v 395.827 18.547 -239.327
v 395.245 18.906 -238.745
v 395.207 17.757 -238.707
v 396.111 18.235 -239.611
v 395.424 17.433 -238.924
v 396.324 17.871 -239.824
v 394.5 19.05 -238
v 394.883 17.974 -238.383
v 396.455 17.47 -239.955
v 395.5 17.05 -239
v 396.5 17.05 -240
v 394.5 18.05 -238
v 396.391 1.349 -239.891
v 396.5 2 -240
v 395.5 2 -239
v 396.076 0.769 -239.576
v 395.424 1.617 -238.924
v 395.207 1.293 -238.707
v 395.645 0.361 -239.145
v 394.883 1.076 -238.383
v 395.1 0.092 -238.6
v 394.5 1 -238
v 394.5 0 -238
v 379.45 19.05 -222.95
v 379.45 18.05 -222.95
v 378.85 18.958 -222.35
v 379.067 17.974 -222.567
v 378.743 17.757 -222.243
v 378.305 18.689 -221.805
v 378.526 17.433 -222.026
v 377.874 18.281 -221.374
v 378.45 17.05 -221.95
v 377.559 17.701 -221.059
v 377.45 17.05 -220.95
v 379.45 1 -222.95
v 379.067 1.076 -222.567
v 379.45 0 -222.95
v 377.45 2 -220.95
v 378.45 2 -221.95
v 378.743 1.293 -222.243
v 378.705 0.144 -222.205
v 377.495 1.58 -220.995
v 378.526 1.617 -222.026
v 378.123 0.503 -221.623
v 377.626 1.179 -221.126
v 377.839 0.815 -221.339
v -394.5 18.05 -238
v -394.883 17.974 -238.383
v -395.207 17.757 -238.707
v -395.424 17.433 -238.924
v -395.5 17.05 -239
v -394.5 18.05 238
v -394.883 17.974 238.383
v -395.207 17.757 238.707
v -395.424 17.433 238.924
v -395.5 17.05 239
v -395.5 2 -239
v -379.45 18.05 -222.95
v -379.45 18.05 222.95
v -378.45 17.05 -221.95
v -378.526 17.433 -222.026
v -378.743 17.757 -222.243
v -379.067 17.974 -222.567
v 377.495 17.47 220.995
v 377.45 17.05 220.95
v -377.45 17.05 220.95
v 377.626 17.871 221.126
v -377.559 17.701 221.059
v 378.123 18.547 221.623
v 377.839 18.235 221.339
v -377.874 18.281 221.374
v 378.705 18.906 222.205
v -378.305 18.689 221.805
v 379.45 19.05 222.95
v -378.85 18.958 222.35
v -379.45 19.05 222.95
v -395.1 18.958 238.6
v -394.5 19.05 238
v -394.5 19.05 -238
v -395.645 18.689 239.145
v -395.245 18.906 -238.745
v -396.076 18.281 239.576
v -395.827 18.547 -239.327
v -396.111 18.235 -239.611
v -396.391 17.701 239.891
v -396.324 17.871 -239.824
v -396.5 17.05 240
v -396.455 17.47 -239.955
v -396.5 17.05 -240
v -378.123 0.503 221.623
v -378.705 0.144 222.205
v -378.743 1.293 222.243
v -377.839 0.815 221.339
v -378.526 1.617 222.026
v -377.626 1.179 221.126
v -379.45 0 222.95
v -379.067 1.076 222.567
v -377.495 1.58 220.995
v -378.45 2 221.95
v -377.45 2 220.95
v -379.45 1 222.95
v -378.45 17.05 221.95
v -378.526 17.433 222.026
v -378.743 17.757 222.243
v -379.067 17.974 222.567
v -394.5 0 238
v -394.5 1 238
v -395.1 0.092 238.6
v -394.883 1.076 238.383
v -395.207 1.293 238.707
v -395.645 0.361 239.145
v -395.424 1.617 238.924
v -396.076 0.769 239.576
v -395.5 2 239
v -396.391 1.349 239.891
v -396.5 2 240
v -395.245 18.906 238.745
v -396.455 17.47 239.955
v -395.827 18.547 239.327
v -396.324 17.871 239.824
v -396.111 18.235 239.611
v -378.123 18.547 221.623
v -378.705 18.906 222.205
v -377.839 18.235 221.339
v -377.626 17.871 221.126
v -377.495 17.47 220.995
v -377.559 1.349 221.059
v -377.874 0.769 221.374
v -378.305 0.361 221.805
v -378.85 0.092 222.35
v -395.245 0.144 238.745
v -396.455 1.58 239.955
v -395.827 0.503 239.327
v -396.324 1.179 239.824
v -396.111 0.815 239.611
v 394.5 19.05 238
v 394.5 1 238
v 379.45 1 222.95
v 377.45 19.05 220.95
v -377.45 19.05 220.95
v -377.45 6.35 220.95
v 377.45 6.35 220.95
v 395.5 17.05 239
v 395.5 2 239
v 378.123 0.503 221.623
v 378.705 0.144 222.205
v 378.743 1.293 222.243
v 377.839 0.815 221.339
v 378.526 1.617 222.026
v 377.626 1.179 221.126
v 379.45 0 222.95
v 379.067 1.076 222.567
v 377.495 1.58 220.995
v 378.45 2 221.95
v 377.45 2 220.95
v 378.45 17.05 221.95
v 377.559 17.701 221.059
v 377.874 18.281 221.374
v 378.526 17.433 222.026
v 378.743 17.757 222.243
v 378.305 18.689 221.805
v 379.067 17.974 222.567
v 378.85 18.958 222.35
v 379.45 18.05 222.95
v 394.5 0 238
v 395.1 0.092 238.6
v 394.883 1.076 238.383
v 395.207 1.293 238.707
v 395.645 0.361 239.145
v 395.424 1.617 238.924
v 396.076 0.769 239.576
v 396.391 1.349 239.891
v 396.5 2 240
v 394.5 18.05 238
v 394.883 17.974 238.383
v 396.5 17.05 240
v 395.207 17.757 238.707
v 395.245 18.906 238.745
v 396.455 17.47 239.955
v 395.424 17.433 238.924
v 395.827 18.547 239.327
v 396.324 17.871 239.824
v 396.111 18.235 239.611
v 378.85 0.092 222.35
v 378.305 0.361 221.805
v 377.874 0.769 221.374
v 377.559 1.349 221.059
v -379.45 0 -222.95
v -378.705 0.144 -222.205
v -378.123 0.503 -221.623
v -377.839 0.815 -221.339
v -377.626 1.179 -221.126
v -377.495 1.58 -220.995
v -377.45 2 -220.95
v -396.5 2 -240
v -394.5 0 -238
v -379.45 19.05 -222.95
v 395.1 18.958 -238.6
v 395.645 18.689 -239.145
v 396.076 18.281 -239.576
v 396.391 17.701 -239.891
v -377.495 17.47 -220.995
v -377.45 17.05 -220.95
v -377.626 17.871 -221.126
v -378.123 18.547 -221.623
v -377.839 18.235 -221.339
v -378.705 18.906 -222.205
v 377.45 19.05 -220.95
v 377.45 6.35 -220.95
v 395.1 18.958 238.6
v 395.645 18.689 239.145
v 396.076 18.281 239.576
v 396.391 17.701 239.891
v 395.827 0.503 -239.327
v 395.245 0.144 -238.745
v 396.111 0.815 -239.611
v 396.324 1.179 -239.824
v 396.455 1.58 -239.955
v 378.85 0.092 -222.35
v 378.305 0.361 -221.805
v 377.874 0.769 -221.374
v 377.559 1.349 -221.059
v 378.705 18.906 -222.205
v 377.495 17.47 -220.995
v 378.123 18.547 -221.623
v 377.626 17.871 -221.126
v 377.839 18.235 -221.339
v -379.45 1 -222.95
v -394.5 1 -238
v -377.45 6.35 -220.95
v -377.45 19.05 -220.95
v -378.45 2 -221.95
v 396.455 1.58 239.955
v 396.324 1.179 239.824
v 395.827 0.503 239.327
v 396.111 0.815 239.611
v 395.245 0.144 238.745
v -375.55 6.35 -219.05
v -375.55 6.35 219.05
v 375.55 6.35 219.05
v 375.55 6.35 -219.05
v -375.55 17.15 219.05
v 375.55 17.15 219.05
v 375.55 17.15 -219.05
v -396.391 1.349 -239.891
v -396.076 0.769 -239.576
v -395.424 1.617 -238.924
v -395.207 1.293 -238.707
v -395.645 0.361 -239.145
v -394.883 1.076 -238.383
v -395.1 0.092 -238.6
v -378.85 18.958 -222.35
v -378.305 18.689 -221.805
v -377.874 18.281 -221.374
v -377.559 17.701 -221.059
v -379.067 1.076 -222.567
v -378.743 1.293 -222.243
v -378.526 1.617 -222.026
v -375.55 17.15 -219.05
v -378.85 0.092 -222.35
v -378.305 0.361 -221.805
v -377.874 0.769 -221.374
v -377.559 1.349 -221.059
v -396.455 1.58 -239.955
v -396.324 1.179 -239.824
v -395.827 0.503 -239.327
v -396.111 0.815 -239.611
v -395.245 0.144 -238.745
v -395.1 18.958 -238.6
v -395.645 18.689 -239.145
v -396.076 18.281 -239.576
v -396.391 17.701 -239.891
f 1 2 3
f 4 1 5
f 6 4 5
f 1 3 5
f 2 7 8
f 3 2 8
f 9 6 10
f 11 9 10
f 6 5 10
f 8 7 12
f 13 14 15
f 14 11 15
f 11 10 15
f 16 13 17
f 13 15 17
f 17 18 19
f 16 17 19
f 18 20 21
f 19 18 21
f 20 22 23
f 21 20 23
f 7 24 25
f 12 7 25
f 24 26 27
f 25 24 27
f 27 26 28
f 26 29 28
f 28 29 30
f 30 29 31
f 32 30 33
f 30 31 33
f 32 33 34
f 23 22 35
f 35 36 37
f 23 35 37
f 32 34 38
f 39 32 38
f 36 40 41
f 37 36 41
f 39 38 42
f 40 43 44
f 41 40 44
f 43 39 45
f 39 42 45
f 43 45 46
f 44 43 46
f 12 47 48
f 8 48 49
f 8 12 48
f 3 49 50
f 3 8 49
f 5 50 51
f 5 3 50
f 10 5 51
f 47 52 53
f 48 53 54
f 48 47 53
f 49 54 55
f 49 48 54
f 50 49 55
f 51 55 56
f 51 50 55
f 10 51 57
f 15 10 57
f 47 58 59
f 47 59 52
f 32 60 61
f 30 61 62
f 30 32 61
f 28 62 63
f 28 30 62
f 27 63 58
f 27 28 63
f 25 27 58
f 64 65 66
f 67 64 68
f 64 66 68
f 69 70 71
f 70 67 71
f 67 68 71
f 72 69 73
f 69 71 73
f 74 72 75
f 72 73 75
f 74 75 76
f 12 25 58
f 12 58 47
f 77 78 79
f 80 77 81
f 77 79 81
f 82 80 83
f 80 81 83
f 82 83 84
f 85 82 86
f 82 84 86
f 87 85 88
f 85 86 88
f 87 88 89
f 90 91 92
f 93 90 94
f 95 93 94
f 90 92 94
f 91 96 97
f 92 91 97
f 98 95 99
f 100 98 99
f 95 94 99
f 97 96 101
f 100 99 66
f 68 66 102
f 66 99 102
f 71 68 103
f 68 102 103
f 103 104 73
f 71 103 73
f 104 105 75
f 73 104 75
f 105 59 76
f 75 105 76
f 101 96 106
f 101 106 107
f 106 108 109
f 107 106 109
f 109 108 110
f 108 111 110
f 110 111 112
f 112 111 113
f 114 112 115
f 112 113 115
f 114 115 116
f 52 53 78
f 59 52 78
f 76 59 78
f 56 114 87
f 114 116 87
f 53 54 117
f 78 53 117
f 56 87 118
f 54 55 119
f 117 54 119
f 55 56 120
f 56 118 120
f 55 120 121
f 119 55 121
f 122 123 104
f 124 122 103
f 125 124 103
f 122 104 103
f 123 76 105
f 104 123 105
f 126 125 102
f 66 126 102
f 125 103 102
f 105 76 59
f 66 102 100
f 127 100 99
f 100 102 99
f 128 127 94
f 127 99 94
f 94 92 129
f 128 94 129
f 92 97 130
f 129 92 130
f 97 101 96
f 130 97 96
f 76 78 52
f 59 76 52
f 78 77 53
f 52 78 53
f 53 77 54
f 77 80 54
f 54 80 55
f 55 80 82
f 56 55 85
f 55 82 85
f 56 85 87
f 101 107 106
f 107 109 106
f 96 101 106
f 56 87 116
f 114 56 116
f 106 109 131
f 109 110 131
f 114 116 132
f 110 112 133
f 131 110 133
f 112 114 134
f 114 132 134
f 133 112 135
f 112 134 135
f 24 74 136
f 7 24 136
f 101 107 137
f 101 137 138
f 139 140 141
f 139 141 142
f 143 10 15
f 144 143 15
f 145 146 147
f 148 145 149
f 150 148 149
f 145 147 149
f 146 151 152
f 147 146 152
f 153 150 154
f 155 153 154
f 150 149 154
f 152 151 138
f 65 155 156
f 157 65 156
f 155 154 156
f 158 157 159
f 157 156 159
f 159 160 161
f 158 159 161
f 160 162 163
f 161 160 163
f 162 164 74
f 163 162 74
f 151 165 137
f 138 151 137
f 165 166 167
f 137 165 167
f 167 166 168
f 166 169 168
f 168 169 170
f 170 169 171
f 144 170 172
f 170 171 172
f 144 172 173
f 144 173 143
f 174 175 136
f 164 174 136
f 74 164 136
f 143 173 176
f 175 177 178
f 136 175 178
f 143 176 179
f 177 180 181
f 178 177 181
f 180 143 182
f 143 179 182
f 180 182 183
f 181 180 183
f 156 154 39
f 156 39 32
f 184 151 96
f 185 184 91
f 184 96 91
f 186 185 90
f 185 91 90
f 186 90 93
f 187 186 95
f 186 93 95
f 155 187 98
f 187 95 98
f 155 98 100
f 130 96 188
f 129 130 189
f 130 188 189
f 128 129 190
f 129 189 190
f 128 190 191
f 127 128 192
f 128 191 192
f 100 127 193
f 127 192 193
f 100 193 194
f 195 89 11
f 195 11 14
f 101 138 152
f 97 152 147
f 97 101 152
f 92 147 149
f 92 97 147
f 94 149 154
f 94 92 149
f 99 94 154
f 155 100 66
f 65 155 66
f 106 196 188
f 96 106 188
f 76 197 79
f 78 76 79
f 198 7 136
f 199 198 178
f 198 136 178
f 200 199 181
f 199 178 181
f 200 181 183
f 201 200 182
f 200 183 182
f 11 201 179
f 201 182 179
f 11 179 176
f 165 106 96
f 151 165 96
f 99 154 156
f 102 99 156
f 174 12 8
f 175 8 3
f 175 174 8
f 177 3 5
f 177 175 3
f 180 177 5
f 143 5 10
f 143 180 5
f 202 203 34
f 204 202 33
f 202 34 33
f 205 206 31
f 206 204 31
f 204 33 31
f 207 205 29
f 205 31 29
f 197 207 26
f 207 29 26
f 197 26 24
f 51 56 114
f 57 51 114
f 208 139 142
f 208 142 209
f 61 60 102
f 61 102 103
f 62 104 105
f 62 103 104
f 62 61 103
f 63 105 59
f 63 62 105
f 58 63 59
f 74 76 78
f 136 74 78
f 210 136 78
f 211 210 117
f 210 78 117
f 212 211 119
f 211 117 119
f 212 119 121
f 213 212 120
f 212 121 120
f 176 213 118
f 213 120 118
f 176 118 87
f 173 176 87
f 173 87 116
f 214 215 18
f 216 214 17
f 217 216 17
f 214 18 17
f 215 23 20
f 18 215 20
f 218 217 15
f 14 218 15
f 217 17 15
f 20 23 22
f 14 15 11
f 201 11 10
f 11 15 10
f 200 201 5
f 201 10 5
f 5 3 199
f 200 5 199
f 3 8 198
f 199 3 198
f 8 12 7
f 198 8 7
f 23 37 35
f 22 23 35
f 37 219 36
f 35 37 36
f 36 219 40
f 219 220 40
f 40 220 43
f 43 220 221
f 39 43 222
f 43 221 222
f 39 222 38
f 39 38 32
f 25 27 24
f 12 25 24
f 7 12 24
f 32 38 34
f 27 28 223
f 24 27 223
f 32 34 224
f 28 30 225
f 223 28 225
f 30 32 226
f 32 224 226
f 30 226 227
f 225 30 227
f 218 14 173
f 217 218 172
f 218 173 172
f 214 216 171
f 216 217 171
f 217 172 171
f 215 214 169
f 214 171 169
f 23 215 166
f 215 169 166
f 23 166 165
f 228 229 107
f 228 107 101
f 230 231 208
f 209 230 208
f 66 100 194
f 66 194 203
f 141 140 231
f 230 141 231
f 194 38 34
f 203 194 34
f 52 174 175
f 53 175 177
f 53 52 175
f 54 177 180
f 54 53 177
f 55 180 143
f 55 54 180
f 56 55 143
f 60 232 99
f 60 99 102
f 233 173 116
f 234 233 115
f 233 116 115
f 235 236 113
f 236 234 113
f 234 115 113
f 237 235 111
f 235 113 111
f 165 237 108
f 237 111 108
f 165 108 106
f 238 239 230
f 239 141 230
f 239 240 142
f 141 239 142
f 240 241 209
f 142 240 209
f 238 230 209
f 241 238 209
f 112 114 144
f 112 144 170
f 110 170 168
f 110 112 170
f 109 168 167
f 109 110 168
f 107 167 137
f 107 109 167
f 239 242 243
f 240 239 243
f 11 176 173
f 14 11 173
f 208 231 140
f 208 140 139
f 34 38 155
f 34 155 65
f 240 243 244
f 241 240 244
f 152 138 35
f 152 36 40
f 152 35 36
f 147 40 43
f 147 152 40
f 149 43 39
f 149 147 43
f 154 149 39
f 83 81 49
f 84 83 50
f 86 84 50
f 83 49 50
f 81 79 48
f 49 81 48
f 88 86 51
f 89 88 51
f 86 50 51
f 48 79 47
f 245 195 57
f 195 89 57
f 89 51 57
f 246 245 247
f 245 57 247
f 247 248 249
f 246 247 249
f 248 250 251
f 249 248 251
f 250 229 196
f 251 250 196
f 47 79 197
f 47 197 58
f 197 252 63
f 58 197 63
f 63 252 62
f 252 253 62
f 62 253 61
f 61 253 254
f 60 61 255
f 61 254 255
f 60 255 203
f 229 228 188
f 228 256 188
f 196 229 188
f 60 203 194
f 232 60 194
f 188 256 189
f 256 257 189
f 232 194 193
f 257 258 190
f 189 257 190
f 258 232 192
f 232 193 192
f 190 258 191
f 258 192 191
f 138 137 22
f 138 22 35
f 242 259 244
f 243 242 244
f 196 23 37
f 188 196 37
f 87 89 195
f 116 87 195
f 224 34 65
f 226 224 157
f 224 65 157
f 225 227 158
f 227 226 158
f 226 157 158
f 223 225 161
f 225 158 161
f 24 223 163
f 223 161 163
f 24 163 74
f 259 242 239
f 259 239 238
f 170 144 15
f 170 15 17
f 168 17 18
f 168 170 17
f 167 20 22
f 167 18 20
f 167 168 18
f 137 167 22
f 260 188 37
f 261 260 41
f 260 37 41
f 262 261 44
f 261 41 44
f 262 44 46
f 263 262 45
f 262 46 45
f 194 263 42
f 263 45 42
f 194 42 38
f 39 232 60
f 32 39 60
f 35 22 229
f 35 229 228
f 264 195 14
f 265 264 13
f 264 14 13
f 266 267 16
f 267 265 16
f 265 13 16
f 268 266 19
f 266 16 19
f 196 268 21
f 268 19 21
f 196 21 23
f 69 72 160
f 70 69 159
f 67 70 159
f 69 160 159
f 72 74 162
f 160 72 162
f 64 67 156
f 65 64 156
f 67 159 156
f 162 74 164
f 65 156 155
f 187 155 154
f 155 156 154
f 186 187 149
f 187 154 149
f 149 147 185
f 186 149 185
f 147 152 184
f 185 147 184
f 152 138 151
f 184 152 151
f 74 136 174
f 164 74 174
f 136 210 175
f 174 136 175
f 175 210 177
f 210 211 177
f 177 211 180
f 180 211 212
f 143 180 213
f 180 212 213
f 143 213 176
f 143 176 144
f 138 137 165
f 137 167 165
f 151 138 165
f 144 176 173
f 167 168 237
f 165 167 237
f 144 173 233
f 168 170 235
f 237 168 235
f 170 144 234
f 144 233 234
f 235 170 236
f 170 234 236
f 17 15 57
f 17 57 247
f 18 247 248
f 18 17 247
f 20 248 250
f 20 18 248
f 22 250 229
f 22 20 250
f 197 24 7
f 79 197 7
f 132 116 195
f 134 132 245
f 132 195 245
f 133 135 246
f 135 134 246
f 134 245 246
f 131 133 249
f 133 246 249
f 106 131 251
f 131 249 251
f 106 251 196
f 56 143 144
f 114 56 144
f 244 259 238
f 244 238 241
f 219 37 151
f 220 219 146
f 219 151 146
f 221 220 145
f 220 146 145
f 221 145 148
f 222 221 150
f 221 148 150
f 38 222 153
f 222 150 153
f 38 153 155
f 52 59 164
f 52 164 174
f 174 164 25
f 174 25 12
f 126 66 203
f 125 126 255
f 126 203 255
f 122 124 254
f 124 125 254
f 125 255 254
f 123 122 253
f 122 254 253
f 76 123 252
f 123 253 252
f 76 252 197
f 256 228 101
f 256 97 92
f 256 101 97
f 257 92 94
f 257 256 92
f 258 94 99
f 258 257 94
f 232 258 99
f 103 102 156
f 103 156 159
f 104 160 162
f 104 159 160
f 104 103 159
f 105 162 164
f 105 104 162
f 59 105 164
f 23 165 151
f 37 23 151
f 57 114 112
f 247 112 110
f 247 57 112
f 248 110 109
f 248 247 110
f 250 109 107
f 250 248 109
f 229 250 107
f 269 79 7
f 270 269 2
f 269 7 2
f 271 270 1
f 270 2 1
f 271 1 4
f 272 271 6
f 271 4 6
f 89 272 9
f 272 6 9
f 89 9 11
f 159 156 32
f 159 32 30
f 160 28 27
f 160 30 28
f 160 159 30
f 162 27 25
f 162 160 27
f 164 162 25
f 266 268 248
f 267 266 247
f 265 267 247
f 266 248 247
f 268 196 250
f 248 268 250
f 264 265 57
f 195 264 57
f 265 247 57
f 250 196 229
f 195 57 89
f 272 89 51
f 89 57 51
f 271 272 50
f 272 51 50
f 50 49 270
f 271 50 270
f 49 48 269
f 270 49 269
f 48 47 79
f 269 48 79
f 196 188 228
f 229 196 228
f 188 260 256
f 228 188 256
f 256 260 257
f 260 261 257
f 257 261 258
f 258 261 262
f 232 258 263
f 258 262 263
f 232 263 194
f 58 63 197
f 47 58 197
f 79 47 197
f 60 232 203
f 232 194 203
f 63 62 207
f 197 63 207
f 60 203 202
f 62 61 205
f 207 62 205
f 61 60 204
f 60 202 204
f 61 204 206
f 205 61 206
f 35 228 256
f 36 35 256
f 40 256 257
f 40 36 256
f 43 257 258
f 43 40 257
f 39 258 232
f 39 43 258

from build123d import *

# Parameters (mm, degrees)
TUBO_CUADRADO_2_X_2_X_0_25_1_DEPTH      = 507.940768363
TUBO_CUADRADO_2_X_2_X_0_25_1_DEPTH_BACK = 27.940768363
TUBO_CUADRADO_2_X_2_X_0_25_1_2_DEPTH    = 848.881536726
TUBO_CUADRADO_2_X_2_X_0_25_1_3_DEPTH    = 535.881536726
TUBO_CUADRADO_2_X_2_X_0_25_1_4_DEPTH    = 848.881536726
CROQUIS2_W                              = 754.9
CROQUIS2_H                              = 441.9
SALIENTE_EXTRUIR1_DEPTH                 = 12.7
VACIADO1_T                              = -1.9


with BuildPart() as part:
    # Sketch1 → Tubo cuadrado 2 X 2 X 0.25(1) (new, two sides: drawn at the far end of the back side and taken through both)
    with BuildSketch(Plane(origin=(-386.975, 9.525, -240), x_dir=(1, 0, 0), z_dir=(0, 0, 1)).offset(-TUBO_CUADRADO_2_X_2_X_0_25_1_DEPTH_BACK)):
        with BuildLine():
            Line((-7.525, -9.525), (7.525, -9.525))
            ThreePointArc((7.525, -9.525), (8.939213562, -8.939213562), (9.525, -7.525))
            Line((9.525, -7.525), (9.525, 7.525))
            ThreePointArc((9.525, 7.525), (8.939213562, 8.939213562), (7.525, 9.525))
            Line((7.525, 9.525), (-7.525, 9.525))
            ThreePointArc((-7.525, 9.525), (-8.939213562, 8.939213562), (-9.525, 7.525))
            Line((-9.525, 7.525), (-9.525, -7.525))
            ThreePointArc((-9.525, -7.525), (-8.939213562, -8.939213562), (-7.525, -9.525))
        make_face()
        with BuildLine():
            Line((-7.525, -8.525), (7.525, -8.525))
            ThreePointArc((7.525, -8.525), (8.232106781, -8.232106781), (8.525, -7.525))
            Line((8.525, -7.525), (8.525, 7.525))
            ThreePointArc((8.525, 7.525), (8.232106781, 8.232106781), (7.525, 8.525))
            Line((7.525, 8.525), (-7.525, 8.525))
            ThreePointArc((-7.525, 8.525), (-8.232106781, 8.232106781), (-8.525, 7.525))
            Line((-8.525, 7.525), (-8.525, -7.525))
            ThreePointArc((-8.525, -7.525), (-8.232106781, -8.232106781), (-7.525, -8.525))
        make_face(mode=Mode.SUBTRACT)
    extrude(amount=TUBO_CUADRADO_2_X_2_X_0_25_1_DEPTH + TUBO_CUADRADO_2_X_2_X_0_25_1_DEPTH_BACK)

    # Tubo cuadrado 2 X 2 X 0.25(1) mitre 1
    split(bisect_by=Plane(origin=(-396.5, 0, -240), x_dir=(0, -1, 0), z_dir=(-0.707106781, 0, 0.707106781)), keep=Keep.TOP)

    # Tubo cuadrado 2 X 2 X 0.25(1) mitre 2
    split(bisect_by=Plane(origin=(-396.5, 0, 240), x_dir=(0, -1, 0), z_dir=(-0.707106781, 0, -0.707106781)), keep=Keep.TOP)


with BuildPart() as body_2:
    # Sketch1 on segment 2 (carried to segment 2) → Tubo cuadrado 2 X 2 X 0.25_1 2 (new body)
    with BuildSketch(Plane(origin=(-424.440768363, 9.525, 230.475), x_dir=(0, 0, -1), z_dir=(1, 0, 0))):
        with BuildLine():
            Line((-7.525, -9.525), (7.525, -9.525))
            ThreePointArc((7.525, -9.525), (8.939213562, -8.939213562), (9.525, -7.525))
            Line((9.525, -7.525), (9.525, 7.525))
            ThreePointArc((9.525, 7.525), (8.939213562, 8.939213562), (7.525, 9.525))
            Line((7.525, 9.525), (-7.525, 9.525))
            ThreePointArc((-7.525, 9.525), (-8.939213562, 8.939213562), (-9.525, 7.525))
            Line((-9.525, 7.525), (-9.525, -7.525))
            ThreePointArc((-9.525, -7.525), (-8.939213562, -8.939213562), (-7.525, -9.525))
        make_face()
        with BuildLine():
            Line((-7.525, -8.525), (7.525, -8.525))
            ThreePointArc((7.525, -8.525), (8.232106781, -8.232106781), (8.525, -7.525))
            Line((8.525, -7.525), (8.525, 7.525))
            ThreePointArc((8.525, 7.525), (8.232106781, 8.232106781), (7.525, 8.525))
            Line((7.525, 8.525), (-7.525, 8.525))
            ThreePointArc((-7.525, 8.525), (-8.232106781, 8.232106781), (-8.525, 7.525))
            Line((-8.525, 7.525), (-8.525, -7.525))
            ThreePointArc((-8.525, -7.525), (-8.232106781, -8.232106781), (-7.525, -8.525))
        make_face(mode=Mode.SUBTRACT)
    extrude(amount=TUBO_CUADRADO_2_X_2_X_0_25_1_2_DEPTH)

    # Tubo cuadrado 2 X 2 X 0.25_1 2 mitre 1
    split(bisect_by=Plane(origin=(-396.5, 0, 240), x_dir=(0, 1, 0), z_dir=(0.707106781, 0, 0.707106781)), keep=Keep.TOP)

    # Tubo cuadrado 2 X 2 X 0.25_1 2 mitre 2
    split(bisect_by=Plane(origin=(396.5, 0, 240), x_dir=(0, -1, 0), z_dir=(-0.707106781, 0, 0.707106781)), keep=Keep.TOP)


with BuildPart() as body_3:
    # Sketch1 on segment 3 (carried to segment 3) → Tubo cuadrado 2 X 2 X 0.25_1 3 (new body)
    with BuildSketch(Plane(origin=(386.975, 9.525, 267.940768363), x_dir=(-1, 0, 0), z_dir=(0, 0, -1))):
        with BuildLine():
            Line((-7.525, -9.525), (7.525, -9.525))
            ThreePointArc((7.525, -9.525), (8.939213562, -8.939213562), (9.525, -7.525))
            Line((9.525, -7.525), (9.525, 7.525))
            ThreePointArc((9.525, 7.525), (8.939213562, 8.939213562), (7.525, 9.525))
            Line((7.525, 9.525), (-7.525, 9.525))
            ThreePointArc((-7.525, 9.525), (-8.939213562, 8.939213562), (-9.525, 7.525))
            Line((-9.525, 7.525), (-9.525, -7.525))
            ThreePointArc((-9.525, -7.525), (-8.939213562, -8.939213562), (-7.525, -9.525))
        make_face()
        with BuildLine():
            Line((-7.525, -8.525), (7.525, -8.525))
            ThreePointArc((7.525, -8.525), (8.232106781, -8.232106781), (8.525, -7.525))
            Line((8.525, -7.525), (8.525, 7.525))
            ThreePointArc((8.525, 7.525), (8.232106781, 8.232106781), (7.525, 8.525))
            Line((7.525, 8.525), (-7.525, 8.525))
            ThreePointArc((-7.525, 8.525), (-8.232106781, 8.232106781), (-8.525, 7.525))
            Line((-8.525, 7.525), (-8.525, -7.525))
            ThreePointArc((-8.525, -7.525), (-8.232106781, -8.232106781), (-7.525, -8.525))
        make_face(mode=Mode.SUBTRACT)
    extrude(amount=TUBO_CUADRADO_2_X_2_X_0_25_1_3_DEPTH)

    # Tubo cuadrado 2 X 2 X 0.25_1 3 mitre 1
    split(bisect_by=Plane(origin=(396.5, 0, -240), x_dir=(0, 1, 0), z_dir=(0.707106781, 0, 0.707106781)), keep=Keep.TOP)

    # Tubo cuadrado 2 X 2 X 0.25_1 3 mitre 2
    split(bisect_by=Plane(origin=(396.5, 0, 240), x_dir=(0, 1, 0), z_dir=(0.707106781, 0, -0.707106781)), keep=Keep.TOP)


with BuildPart() as body_4:
    # Sketch1 on segment 4 (carried to segment 4) → Tubo cuadrado 2 X 2 X 0.25_1 4 (new body)
    with BuildSketch(Plane(origin=(424.440768363, 9.525, -230.475), x_dir=(0, 0, 1), z_dir=(-1, 0, 0))):
        with BuildLine():
            Line((-7.525, -9.525), (7.525, -9.525))
            ThreePointArc((7.525, -9.525), (8.939213562, -8.939213562), (9.525, -7.525))
            Line((9.525, -7.525), (9.525, 7.525))
            ThreePointArc((9.525, 7.525), (8.939213562, 8.939213562), (7.525, 9.525))
            Line((7.525, 9.525), (-7.525, 9.525))
            ThreePointArc((-7.525, 9.525), (-8.939213562, 8.939213562), (-9.525, 7.525))
            Line((-9.525, 7.525), (-9.525, -7.525))
            ThreePointArc((-9.525, -7.525), (-8.939213562, -8.939213562), (-7.525, -9.525))
        make_face()
        with BuildLine():
            Line((-7.525, -8.525), (7.525, -8.525))
            ThreePointArc((7.525, -8.525), (8.232106781, -8.232106781), (8.525, -7.525))
            Line((8.525, -7.525), (8.525, 7.525))
            ThreePointArc((8.525, 7.525), (8.232106781, 8.232106781), (7.525, 8.525))
            Line((7.525, 8.525), (-7.525, 8.525))
            ThreePointArc((-7.525, 8.525), (-8.232106781, 8.232106781), (-8.525, 7.525))
            Line((-8.525, 7.525), (-8.525, -7.525))
            ThreePointArc((-8.525, -7.525), (-8.232106781, -8.232106781), (-7.525, -8.525))
        make_face(mode=Mode.SUBTRACT)
    extrude(amount=TUBO_CUADRADO_2_X_2_X_0_25_1_4_DEPTH)

    # Tubo cuadrado 2 X 2 X 0.25_1 4 mitre 1
    split(bisect_by=Plane(origin=(-396.5, 0, -240), x_dir=(0, 1, 0), z_dir=(0.707106781, 0, -0.707106781)), keep=Keep.TOP)

    # Tubo cuadrado 2 X 2 X 0.25_1 4 mitre 2
    split(bisect_by=Plane(origin=(396.5, 0, -240), x_dir=(0, -1, 0), z_dir=(-0.707106781, 0, -0.707106781)), keep=Keep.TOP)


with BuildPart() as body_5:
    # Croquis2 → Saliente-Extruir1 (new body)
    with BuildSketch(Plane(origin=(0, 19.05, 0), x_dir=(1, 0, 0), z_dir=(0, 1, 0))):
        Rectangle(CROQUIS2_W, CROQUIS2_H)
    extrude(amount=-SALIENTE_EXTRUIR1_DEPTH)

    # Vaciado1
    vaciado1_openings = [body_5.faces().sort_by_distance(p)[0] for p in [
        (0, 6.35, 0),
    ]]
    offset(amount=VACIADO1_T, openings=vaciado1_openings, kind=Kind.INTERSECTION)


solid = Compound([part.part, body_2.part, body_3.part, body_4.part, body_5.part])
